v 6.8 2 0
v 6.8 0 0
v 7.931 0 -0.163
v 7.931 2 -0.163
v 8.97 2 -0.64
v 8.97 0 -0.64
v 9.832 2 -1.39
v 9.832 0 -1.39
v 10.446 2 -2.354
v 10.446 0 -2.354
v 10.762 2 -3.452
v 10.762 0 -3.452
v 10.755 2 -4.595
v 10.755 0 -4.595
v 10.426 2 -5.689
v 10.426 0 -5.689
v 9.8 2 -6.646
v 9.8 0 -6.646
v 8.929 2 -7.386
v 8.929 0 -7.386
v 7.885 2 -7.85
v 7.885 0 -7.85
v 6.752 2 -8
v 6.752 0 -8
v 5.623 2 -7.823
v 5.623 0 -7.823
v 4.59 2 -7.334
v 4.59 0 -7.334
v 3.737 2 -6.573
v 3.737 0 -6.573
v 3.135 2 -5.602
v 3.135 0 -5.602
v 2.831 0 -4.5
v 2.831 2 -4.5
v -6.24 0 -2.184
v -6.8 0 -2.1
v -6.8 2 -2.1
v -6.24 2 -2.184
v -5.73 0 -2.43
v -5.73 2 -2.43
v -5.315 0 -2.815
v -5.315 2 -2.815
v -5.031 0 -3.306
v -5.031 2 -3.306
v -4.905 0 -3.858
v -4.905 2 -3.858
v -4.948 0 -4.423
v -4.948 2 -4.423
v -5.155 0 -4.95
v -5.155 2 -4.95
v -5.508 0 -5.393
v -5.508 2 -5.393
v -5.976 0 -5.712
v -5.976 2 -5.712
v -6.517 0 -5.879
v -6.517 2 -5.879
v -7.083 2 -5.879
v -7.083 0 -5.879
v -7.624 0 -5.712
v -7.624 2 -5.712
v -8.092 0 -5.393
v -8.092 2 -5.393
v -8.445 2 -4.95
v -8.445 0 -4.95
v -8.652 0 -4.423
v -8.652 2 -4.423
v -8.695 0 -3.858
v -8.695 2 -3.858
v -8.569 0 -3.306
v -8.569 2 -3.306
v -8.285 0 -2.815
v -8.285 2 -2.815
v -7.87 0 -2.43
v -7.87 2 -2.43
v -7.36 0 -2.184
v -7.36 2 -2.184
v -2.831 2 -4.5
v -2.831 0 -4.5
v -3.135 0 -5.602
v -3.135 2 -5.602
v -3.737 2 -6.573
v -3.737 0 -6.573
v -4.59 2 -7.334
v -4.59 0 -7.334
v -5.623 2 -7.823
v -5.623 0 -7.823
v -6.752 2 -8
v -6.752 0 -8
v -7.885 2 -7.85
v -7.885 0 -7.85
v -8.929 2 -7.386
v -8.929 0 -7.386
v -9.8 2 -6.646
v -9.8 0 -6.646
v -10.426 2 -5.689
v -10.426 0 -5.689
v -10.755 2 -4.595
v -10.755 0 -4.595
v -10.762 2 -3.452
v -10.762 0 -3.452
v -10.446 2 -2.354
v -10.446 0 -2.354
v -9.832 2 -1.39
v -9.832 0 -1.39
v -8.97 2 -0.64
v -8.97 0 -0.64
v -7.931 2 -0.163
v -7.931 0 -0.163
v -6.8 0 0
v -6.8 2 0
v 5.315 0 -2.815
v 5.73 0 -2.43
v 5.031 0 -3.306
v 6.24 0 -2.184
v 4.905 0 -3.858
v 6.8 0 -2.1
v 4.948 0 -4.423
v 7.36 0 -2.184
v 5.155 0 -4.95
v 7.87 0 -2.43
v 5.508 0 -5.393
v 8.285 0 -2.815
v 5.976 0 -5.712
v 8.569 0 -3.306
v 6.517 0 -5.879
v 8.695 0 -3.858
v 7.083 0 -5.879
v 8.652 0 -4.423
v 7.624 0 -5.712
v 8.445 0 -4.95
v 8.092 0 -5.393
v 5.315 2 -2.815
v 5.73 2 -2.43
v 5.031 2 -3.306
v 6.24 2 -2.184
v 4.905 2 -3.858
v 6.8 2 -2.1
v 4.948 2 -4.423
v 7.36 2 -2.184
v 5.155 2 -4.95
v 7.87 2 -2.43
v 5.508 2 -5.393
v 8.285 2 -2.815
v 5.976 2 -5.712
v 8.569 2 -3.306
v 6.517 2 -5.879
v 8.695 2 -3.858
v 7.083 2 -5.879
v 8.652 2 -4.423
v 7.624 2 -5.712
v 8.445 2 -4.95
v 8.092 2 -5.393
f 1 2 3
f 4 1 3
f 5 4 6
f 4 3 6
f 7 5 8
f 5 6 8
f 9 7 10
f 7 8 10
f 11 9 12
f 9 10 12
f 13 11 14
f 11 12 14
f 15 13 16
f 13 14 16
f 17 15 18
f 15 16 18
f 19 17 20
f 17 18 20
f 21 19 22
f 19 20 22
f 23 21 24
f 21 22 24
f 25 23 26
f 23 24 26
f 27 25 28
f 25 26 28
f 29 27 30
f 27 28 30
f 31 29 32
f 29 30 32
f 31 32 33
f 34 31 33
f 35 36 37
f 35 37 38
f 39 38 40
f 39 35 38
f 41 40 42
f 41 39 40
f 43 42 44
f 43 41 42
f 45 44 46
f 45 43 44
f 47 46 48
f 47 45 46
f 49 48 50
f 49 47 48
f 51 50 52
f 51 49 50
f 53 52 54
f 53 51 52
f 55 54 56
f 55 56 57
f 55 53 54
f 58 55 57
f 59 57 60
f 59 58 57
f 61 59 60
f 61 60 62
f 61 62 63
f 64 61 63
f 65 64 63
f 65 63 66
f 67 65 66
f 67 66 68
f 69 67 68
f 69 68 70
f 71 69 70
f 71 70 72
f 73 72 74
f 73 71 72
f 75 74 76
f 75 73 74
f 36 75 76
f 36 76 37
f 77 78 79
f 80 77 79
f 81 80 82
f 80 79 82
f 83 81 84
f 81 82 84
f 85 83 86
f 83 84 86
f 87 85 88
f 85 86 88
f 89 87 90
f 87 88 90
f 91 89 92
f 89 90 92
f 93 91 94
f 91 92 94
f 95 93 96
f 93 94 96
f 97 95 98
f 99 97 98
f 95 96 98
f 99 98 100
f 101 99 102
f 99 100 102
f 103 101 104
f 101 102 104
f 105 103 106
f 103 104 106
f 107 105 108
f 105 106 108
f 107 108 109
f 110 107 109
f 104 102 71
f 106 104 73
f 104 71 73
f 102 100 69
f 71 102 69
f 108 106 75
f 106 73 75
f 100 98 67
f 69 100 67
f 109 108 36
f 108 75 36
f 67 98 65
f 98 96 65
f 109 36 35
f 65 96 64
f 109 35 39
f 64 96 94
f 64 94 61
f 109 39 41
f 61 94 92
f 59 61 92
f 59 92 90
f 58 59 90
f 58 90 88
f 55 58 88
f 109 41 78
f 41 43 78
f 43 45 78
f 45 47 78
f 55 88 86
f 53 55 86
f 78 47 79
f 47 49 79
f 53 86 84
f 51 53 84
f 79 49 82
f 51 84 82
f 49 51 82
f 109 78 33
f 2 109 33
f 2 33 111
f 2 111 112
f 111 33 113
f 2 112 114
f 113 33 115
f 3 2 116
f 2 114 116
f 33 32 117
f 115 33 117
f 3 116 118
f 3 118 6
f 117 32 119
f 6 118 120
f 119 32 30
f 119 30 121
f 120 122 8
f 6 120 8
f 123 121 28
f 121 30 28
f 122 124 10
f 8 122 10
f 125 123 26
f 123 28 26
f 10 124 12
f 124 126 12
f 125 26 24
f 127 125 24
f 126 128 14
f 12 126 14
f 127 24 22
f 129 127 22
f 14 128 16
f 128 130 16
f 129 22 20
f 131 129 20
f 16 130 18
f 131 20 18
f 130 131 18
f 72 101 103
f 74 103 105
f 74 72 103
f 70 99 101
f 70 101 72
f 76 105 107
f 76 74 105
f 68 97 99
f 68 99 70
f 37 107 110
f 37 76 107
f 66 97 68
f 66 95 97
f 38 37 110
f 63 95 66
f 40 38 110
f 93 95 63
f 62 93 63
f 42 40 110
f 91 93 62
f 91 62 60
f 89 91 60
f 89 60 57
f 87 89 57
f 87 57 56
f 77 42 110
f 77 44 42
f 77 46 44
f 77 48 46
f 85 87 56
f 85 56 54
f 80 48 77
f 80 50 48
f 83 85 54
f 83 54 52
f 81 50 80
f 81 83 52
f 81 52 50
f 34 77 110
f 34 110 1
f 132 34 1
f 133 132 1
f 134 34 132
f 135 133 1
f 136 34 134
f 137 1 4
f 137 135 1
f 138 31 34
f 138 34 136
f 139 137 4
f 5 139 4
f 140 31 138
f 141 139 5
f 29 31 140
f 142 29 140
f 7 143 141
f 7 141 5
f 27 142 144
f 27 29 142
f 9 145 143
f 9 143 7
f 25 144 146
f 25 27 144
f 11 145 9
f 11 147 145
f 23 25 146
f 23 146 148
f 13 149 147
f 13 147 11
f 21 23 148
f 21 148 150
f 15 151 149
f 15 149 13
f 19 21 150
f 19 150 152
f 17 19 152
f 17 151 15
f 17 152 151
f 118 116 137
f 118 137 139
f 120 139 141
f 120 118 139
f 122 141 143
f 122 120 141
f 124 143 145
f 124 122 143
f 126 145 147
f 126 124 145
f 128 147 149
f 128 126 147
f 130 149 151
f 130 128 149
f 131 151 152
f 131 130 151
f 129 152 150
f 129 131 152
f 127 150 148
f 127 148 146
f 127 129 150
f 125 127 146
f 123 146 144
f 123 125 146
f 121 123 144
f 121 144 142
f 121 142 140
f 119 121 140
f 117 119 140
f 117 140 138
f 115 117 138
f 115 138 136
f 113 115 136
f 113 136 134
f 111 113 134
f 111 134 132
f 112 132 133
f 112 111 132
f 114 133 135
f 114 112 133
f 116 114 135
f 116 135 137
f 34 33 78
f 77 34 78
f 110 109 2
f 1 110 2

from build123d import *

# Parameters (mm, degrees)
SKETCH1_R           = 4
SKETCH1_R_2         = 1.9
BOSS_EXTRUDE1_DEPTH = 2


with BuildPart() as part:
    # Sketch1 → Boss-Extrude1 (new body)
    # profile 1 of 4: a face of its own
    with BuildSketch(Plane(origin=(0, 0, 0), x_dir=(1, 0, 0), z_dir=(0, 1, 0))):
        with Locations((-6.8, 4)):
            Circle(SKETCH1_R)
        with Locations(Location((-6.8, 4, 0), (0, 0, 270))):
            Circle(SKETCH1_R_2, mode=Mode.SUBTRACT)
    # profile 2 of 4: a face of its own
    with BuildSketch(Plane(origin=(0, 0, 0), x_dir=(1, 0, 0), z_dir=(0, 1, 0))):
        with BuildLine():
            Line((-6.8, 0), (0, 0))
            Line((0, 0), (0, 4.5))
            Line((0, 4.5), (-2.831373033, 4.5))
            ThreePointArc((-2.831373033, 4.5), (-2.807850963, 4.25049165), (-2.8, 4))
            ThreePointArc((-2.8, 4), (-3.971572875, 1.171572875), (-6.8, 0))
        make_face()
    # profile 3 of 4: a face of its own
    with BuildSketch(Plane(origin=(0, 0, 0), x_dir=(1, 0, 0), z_dir=(0, 1, 0))):
        with BuildLine():
            Line((0, 4.5), (0, 0))
            Line((0, 0), (6.8, 0))
            ThreePointArc((6.8, 0), (3.8, 1.354248689), (2.831373033, 4.5))
            Line((2.831373033, 4.5), (0, 4.5))
        make_face()
    # profile 4 of 4: a face of its own
    with BuildSketch(Plane(origin=(0, 0, 0), x_dir=(1, 0, 0), z_dir=(0, 1, 0))):
        with Locations((6.8, 4)):
            Circle(SKETCH1_R)
        with Locations(Location((6.8, 4, 0), (0, 0, 270))):
            Circle(SKETCH1_R_2, mode=Mode.SUBTRACT)
    extrude(amount=BOSS_EXTRUDE1_DEPTH)


solid = part.part
